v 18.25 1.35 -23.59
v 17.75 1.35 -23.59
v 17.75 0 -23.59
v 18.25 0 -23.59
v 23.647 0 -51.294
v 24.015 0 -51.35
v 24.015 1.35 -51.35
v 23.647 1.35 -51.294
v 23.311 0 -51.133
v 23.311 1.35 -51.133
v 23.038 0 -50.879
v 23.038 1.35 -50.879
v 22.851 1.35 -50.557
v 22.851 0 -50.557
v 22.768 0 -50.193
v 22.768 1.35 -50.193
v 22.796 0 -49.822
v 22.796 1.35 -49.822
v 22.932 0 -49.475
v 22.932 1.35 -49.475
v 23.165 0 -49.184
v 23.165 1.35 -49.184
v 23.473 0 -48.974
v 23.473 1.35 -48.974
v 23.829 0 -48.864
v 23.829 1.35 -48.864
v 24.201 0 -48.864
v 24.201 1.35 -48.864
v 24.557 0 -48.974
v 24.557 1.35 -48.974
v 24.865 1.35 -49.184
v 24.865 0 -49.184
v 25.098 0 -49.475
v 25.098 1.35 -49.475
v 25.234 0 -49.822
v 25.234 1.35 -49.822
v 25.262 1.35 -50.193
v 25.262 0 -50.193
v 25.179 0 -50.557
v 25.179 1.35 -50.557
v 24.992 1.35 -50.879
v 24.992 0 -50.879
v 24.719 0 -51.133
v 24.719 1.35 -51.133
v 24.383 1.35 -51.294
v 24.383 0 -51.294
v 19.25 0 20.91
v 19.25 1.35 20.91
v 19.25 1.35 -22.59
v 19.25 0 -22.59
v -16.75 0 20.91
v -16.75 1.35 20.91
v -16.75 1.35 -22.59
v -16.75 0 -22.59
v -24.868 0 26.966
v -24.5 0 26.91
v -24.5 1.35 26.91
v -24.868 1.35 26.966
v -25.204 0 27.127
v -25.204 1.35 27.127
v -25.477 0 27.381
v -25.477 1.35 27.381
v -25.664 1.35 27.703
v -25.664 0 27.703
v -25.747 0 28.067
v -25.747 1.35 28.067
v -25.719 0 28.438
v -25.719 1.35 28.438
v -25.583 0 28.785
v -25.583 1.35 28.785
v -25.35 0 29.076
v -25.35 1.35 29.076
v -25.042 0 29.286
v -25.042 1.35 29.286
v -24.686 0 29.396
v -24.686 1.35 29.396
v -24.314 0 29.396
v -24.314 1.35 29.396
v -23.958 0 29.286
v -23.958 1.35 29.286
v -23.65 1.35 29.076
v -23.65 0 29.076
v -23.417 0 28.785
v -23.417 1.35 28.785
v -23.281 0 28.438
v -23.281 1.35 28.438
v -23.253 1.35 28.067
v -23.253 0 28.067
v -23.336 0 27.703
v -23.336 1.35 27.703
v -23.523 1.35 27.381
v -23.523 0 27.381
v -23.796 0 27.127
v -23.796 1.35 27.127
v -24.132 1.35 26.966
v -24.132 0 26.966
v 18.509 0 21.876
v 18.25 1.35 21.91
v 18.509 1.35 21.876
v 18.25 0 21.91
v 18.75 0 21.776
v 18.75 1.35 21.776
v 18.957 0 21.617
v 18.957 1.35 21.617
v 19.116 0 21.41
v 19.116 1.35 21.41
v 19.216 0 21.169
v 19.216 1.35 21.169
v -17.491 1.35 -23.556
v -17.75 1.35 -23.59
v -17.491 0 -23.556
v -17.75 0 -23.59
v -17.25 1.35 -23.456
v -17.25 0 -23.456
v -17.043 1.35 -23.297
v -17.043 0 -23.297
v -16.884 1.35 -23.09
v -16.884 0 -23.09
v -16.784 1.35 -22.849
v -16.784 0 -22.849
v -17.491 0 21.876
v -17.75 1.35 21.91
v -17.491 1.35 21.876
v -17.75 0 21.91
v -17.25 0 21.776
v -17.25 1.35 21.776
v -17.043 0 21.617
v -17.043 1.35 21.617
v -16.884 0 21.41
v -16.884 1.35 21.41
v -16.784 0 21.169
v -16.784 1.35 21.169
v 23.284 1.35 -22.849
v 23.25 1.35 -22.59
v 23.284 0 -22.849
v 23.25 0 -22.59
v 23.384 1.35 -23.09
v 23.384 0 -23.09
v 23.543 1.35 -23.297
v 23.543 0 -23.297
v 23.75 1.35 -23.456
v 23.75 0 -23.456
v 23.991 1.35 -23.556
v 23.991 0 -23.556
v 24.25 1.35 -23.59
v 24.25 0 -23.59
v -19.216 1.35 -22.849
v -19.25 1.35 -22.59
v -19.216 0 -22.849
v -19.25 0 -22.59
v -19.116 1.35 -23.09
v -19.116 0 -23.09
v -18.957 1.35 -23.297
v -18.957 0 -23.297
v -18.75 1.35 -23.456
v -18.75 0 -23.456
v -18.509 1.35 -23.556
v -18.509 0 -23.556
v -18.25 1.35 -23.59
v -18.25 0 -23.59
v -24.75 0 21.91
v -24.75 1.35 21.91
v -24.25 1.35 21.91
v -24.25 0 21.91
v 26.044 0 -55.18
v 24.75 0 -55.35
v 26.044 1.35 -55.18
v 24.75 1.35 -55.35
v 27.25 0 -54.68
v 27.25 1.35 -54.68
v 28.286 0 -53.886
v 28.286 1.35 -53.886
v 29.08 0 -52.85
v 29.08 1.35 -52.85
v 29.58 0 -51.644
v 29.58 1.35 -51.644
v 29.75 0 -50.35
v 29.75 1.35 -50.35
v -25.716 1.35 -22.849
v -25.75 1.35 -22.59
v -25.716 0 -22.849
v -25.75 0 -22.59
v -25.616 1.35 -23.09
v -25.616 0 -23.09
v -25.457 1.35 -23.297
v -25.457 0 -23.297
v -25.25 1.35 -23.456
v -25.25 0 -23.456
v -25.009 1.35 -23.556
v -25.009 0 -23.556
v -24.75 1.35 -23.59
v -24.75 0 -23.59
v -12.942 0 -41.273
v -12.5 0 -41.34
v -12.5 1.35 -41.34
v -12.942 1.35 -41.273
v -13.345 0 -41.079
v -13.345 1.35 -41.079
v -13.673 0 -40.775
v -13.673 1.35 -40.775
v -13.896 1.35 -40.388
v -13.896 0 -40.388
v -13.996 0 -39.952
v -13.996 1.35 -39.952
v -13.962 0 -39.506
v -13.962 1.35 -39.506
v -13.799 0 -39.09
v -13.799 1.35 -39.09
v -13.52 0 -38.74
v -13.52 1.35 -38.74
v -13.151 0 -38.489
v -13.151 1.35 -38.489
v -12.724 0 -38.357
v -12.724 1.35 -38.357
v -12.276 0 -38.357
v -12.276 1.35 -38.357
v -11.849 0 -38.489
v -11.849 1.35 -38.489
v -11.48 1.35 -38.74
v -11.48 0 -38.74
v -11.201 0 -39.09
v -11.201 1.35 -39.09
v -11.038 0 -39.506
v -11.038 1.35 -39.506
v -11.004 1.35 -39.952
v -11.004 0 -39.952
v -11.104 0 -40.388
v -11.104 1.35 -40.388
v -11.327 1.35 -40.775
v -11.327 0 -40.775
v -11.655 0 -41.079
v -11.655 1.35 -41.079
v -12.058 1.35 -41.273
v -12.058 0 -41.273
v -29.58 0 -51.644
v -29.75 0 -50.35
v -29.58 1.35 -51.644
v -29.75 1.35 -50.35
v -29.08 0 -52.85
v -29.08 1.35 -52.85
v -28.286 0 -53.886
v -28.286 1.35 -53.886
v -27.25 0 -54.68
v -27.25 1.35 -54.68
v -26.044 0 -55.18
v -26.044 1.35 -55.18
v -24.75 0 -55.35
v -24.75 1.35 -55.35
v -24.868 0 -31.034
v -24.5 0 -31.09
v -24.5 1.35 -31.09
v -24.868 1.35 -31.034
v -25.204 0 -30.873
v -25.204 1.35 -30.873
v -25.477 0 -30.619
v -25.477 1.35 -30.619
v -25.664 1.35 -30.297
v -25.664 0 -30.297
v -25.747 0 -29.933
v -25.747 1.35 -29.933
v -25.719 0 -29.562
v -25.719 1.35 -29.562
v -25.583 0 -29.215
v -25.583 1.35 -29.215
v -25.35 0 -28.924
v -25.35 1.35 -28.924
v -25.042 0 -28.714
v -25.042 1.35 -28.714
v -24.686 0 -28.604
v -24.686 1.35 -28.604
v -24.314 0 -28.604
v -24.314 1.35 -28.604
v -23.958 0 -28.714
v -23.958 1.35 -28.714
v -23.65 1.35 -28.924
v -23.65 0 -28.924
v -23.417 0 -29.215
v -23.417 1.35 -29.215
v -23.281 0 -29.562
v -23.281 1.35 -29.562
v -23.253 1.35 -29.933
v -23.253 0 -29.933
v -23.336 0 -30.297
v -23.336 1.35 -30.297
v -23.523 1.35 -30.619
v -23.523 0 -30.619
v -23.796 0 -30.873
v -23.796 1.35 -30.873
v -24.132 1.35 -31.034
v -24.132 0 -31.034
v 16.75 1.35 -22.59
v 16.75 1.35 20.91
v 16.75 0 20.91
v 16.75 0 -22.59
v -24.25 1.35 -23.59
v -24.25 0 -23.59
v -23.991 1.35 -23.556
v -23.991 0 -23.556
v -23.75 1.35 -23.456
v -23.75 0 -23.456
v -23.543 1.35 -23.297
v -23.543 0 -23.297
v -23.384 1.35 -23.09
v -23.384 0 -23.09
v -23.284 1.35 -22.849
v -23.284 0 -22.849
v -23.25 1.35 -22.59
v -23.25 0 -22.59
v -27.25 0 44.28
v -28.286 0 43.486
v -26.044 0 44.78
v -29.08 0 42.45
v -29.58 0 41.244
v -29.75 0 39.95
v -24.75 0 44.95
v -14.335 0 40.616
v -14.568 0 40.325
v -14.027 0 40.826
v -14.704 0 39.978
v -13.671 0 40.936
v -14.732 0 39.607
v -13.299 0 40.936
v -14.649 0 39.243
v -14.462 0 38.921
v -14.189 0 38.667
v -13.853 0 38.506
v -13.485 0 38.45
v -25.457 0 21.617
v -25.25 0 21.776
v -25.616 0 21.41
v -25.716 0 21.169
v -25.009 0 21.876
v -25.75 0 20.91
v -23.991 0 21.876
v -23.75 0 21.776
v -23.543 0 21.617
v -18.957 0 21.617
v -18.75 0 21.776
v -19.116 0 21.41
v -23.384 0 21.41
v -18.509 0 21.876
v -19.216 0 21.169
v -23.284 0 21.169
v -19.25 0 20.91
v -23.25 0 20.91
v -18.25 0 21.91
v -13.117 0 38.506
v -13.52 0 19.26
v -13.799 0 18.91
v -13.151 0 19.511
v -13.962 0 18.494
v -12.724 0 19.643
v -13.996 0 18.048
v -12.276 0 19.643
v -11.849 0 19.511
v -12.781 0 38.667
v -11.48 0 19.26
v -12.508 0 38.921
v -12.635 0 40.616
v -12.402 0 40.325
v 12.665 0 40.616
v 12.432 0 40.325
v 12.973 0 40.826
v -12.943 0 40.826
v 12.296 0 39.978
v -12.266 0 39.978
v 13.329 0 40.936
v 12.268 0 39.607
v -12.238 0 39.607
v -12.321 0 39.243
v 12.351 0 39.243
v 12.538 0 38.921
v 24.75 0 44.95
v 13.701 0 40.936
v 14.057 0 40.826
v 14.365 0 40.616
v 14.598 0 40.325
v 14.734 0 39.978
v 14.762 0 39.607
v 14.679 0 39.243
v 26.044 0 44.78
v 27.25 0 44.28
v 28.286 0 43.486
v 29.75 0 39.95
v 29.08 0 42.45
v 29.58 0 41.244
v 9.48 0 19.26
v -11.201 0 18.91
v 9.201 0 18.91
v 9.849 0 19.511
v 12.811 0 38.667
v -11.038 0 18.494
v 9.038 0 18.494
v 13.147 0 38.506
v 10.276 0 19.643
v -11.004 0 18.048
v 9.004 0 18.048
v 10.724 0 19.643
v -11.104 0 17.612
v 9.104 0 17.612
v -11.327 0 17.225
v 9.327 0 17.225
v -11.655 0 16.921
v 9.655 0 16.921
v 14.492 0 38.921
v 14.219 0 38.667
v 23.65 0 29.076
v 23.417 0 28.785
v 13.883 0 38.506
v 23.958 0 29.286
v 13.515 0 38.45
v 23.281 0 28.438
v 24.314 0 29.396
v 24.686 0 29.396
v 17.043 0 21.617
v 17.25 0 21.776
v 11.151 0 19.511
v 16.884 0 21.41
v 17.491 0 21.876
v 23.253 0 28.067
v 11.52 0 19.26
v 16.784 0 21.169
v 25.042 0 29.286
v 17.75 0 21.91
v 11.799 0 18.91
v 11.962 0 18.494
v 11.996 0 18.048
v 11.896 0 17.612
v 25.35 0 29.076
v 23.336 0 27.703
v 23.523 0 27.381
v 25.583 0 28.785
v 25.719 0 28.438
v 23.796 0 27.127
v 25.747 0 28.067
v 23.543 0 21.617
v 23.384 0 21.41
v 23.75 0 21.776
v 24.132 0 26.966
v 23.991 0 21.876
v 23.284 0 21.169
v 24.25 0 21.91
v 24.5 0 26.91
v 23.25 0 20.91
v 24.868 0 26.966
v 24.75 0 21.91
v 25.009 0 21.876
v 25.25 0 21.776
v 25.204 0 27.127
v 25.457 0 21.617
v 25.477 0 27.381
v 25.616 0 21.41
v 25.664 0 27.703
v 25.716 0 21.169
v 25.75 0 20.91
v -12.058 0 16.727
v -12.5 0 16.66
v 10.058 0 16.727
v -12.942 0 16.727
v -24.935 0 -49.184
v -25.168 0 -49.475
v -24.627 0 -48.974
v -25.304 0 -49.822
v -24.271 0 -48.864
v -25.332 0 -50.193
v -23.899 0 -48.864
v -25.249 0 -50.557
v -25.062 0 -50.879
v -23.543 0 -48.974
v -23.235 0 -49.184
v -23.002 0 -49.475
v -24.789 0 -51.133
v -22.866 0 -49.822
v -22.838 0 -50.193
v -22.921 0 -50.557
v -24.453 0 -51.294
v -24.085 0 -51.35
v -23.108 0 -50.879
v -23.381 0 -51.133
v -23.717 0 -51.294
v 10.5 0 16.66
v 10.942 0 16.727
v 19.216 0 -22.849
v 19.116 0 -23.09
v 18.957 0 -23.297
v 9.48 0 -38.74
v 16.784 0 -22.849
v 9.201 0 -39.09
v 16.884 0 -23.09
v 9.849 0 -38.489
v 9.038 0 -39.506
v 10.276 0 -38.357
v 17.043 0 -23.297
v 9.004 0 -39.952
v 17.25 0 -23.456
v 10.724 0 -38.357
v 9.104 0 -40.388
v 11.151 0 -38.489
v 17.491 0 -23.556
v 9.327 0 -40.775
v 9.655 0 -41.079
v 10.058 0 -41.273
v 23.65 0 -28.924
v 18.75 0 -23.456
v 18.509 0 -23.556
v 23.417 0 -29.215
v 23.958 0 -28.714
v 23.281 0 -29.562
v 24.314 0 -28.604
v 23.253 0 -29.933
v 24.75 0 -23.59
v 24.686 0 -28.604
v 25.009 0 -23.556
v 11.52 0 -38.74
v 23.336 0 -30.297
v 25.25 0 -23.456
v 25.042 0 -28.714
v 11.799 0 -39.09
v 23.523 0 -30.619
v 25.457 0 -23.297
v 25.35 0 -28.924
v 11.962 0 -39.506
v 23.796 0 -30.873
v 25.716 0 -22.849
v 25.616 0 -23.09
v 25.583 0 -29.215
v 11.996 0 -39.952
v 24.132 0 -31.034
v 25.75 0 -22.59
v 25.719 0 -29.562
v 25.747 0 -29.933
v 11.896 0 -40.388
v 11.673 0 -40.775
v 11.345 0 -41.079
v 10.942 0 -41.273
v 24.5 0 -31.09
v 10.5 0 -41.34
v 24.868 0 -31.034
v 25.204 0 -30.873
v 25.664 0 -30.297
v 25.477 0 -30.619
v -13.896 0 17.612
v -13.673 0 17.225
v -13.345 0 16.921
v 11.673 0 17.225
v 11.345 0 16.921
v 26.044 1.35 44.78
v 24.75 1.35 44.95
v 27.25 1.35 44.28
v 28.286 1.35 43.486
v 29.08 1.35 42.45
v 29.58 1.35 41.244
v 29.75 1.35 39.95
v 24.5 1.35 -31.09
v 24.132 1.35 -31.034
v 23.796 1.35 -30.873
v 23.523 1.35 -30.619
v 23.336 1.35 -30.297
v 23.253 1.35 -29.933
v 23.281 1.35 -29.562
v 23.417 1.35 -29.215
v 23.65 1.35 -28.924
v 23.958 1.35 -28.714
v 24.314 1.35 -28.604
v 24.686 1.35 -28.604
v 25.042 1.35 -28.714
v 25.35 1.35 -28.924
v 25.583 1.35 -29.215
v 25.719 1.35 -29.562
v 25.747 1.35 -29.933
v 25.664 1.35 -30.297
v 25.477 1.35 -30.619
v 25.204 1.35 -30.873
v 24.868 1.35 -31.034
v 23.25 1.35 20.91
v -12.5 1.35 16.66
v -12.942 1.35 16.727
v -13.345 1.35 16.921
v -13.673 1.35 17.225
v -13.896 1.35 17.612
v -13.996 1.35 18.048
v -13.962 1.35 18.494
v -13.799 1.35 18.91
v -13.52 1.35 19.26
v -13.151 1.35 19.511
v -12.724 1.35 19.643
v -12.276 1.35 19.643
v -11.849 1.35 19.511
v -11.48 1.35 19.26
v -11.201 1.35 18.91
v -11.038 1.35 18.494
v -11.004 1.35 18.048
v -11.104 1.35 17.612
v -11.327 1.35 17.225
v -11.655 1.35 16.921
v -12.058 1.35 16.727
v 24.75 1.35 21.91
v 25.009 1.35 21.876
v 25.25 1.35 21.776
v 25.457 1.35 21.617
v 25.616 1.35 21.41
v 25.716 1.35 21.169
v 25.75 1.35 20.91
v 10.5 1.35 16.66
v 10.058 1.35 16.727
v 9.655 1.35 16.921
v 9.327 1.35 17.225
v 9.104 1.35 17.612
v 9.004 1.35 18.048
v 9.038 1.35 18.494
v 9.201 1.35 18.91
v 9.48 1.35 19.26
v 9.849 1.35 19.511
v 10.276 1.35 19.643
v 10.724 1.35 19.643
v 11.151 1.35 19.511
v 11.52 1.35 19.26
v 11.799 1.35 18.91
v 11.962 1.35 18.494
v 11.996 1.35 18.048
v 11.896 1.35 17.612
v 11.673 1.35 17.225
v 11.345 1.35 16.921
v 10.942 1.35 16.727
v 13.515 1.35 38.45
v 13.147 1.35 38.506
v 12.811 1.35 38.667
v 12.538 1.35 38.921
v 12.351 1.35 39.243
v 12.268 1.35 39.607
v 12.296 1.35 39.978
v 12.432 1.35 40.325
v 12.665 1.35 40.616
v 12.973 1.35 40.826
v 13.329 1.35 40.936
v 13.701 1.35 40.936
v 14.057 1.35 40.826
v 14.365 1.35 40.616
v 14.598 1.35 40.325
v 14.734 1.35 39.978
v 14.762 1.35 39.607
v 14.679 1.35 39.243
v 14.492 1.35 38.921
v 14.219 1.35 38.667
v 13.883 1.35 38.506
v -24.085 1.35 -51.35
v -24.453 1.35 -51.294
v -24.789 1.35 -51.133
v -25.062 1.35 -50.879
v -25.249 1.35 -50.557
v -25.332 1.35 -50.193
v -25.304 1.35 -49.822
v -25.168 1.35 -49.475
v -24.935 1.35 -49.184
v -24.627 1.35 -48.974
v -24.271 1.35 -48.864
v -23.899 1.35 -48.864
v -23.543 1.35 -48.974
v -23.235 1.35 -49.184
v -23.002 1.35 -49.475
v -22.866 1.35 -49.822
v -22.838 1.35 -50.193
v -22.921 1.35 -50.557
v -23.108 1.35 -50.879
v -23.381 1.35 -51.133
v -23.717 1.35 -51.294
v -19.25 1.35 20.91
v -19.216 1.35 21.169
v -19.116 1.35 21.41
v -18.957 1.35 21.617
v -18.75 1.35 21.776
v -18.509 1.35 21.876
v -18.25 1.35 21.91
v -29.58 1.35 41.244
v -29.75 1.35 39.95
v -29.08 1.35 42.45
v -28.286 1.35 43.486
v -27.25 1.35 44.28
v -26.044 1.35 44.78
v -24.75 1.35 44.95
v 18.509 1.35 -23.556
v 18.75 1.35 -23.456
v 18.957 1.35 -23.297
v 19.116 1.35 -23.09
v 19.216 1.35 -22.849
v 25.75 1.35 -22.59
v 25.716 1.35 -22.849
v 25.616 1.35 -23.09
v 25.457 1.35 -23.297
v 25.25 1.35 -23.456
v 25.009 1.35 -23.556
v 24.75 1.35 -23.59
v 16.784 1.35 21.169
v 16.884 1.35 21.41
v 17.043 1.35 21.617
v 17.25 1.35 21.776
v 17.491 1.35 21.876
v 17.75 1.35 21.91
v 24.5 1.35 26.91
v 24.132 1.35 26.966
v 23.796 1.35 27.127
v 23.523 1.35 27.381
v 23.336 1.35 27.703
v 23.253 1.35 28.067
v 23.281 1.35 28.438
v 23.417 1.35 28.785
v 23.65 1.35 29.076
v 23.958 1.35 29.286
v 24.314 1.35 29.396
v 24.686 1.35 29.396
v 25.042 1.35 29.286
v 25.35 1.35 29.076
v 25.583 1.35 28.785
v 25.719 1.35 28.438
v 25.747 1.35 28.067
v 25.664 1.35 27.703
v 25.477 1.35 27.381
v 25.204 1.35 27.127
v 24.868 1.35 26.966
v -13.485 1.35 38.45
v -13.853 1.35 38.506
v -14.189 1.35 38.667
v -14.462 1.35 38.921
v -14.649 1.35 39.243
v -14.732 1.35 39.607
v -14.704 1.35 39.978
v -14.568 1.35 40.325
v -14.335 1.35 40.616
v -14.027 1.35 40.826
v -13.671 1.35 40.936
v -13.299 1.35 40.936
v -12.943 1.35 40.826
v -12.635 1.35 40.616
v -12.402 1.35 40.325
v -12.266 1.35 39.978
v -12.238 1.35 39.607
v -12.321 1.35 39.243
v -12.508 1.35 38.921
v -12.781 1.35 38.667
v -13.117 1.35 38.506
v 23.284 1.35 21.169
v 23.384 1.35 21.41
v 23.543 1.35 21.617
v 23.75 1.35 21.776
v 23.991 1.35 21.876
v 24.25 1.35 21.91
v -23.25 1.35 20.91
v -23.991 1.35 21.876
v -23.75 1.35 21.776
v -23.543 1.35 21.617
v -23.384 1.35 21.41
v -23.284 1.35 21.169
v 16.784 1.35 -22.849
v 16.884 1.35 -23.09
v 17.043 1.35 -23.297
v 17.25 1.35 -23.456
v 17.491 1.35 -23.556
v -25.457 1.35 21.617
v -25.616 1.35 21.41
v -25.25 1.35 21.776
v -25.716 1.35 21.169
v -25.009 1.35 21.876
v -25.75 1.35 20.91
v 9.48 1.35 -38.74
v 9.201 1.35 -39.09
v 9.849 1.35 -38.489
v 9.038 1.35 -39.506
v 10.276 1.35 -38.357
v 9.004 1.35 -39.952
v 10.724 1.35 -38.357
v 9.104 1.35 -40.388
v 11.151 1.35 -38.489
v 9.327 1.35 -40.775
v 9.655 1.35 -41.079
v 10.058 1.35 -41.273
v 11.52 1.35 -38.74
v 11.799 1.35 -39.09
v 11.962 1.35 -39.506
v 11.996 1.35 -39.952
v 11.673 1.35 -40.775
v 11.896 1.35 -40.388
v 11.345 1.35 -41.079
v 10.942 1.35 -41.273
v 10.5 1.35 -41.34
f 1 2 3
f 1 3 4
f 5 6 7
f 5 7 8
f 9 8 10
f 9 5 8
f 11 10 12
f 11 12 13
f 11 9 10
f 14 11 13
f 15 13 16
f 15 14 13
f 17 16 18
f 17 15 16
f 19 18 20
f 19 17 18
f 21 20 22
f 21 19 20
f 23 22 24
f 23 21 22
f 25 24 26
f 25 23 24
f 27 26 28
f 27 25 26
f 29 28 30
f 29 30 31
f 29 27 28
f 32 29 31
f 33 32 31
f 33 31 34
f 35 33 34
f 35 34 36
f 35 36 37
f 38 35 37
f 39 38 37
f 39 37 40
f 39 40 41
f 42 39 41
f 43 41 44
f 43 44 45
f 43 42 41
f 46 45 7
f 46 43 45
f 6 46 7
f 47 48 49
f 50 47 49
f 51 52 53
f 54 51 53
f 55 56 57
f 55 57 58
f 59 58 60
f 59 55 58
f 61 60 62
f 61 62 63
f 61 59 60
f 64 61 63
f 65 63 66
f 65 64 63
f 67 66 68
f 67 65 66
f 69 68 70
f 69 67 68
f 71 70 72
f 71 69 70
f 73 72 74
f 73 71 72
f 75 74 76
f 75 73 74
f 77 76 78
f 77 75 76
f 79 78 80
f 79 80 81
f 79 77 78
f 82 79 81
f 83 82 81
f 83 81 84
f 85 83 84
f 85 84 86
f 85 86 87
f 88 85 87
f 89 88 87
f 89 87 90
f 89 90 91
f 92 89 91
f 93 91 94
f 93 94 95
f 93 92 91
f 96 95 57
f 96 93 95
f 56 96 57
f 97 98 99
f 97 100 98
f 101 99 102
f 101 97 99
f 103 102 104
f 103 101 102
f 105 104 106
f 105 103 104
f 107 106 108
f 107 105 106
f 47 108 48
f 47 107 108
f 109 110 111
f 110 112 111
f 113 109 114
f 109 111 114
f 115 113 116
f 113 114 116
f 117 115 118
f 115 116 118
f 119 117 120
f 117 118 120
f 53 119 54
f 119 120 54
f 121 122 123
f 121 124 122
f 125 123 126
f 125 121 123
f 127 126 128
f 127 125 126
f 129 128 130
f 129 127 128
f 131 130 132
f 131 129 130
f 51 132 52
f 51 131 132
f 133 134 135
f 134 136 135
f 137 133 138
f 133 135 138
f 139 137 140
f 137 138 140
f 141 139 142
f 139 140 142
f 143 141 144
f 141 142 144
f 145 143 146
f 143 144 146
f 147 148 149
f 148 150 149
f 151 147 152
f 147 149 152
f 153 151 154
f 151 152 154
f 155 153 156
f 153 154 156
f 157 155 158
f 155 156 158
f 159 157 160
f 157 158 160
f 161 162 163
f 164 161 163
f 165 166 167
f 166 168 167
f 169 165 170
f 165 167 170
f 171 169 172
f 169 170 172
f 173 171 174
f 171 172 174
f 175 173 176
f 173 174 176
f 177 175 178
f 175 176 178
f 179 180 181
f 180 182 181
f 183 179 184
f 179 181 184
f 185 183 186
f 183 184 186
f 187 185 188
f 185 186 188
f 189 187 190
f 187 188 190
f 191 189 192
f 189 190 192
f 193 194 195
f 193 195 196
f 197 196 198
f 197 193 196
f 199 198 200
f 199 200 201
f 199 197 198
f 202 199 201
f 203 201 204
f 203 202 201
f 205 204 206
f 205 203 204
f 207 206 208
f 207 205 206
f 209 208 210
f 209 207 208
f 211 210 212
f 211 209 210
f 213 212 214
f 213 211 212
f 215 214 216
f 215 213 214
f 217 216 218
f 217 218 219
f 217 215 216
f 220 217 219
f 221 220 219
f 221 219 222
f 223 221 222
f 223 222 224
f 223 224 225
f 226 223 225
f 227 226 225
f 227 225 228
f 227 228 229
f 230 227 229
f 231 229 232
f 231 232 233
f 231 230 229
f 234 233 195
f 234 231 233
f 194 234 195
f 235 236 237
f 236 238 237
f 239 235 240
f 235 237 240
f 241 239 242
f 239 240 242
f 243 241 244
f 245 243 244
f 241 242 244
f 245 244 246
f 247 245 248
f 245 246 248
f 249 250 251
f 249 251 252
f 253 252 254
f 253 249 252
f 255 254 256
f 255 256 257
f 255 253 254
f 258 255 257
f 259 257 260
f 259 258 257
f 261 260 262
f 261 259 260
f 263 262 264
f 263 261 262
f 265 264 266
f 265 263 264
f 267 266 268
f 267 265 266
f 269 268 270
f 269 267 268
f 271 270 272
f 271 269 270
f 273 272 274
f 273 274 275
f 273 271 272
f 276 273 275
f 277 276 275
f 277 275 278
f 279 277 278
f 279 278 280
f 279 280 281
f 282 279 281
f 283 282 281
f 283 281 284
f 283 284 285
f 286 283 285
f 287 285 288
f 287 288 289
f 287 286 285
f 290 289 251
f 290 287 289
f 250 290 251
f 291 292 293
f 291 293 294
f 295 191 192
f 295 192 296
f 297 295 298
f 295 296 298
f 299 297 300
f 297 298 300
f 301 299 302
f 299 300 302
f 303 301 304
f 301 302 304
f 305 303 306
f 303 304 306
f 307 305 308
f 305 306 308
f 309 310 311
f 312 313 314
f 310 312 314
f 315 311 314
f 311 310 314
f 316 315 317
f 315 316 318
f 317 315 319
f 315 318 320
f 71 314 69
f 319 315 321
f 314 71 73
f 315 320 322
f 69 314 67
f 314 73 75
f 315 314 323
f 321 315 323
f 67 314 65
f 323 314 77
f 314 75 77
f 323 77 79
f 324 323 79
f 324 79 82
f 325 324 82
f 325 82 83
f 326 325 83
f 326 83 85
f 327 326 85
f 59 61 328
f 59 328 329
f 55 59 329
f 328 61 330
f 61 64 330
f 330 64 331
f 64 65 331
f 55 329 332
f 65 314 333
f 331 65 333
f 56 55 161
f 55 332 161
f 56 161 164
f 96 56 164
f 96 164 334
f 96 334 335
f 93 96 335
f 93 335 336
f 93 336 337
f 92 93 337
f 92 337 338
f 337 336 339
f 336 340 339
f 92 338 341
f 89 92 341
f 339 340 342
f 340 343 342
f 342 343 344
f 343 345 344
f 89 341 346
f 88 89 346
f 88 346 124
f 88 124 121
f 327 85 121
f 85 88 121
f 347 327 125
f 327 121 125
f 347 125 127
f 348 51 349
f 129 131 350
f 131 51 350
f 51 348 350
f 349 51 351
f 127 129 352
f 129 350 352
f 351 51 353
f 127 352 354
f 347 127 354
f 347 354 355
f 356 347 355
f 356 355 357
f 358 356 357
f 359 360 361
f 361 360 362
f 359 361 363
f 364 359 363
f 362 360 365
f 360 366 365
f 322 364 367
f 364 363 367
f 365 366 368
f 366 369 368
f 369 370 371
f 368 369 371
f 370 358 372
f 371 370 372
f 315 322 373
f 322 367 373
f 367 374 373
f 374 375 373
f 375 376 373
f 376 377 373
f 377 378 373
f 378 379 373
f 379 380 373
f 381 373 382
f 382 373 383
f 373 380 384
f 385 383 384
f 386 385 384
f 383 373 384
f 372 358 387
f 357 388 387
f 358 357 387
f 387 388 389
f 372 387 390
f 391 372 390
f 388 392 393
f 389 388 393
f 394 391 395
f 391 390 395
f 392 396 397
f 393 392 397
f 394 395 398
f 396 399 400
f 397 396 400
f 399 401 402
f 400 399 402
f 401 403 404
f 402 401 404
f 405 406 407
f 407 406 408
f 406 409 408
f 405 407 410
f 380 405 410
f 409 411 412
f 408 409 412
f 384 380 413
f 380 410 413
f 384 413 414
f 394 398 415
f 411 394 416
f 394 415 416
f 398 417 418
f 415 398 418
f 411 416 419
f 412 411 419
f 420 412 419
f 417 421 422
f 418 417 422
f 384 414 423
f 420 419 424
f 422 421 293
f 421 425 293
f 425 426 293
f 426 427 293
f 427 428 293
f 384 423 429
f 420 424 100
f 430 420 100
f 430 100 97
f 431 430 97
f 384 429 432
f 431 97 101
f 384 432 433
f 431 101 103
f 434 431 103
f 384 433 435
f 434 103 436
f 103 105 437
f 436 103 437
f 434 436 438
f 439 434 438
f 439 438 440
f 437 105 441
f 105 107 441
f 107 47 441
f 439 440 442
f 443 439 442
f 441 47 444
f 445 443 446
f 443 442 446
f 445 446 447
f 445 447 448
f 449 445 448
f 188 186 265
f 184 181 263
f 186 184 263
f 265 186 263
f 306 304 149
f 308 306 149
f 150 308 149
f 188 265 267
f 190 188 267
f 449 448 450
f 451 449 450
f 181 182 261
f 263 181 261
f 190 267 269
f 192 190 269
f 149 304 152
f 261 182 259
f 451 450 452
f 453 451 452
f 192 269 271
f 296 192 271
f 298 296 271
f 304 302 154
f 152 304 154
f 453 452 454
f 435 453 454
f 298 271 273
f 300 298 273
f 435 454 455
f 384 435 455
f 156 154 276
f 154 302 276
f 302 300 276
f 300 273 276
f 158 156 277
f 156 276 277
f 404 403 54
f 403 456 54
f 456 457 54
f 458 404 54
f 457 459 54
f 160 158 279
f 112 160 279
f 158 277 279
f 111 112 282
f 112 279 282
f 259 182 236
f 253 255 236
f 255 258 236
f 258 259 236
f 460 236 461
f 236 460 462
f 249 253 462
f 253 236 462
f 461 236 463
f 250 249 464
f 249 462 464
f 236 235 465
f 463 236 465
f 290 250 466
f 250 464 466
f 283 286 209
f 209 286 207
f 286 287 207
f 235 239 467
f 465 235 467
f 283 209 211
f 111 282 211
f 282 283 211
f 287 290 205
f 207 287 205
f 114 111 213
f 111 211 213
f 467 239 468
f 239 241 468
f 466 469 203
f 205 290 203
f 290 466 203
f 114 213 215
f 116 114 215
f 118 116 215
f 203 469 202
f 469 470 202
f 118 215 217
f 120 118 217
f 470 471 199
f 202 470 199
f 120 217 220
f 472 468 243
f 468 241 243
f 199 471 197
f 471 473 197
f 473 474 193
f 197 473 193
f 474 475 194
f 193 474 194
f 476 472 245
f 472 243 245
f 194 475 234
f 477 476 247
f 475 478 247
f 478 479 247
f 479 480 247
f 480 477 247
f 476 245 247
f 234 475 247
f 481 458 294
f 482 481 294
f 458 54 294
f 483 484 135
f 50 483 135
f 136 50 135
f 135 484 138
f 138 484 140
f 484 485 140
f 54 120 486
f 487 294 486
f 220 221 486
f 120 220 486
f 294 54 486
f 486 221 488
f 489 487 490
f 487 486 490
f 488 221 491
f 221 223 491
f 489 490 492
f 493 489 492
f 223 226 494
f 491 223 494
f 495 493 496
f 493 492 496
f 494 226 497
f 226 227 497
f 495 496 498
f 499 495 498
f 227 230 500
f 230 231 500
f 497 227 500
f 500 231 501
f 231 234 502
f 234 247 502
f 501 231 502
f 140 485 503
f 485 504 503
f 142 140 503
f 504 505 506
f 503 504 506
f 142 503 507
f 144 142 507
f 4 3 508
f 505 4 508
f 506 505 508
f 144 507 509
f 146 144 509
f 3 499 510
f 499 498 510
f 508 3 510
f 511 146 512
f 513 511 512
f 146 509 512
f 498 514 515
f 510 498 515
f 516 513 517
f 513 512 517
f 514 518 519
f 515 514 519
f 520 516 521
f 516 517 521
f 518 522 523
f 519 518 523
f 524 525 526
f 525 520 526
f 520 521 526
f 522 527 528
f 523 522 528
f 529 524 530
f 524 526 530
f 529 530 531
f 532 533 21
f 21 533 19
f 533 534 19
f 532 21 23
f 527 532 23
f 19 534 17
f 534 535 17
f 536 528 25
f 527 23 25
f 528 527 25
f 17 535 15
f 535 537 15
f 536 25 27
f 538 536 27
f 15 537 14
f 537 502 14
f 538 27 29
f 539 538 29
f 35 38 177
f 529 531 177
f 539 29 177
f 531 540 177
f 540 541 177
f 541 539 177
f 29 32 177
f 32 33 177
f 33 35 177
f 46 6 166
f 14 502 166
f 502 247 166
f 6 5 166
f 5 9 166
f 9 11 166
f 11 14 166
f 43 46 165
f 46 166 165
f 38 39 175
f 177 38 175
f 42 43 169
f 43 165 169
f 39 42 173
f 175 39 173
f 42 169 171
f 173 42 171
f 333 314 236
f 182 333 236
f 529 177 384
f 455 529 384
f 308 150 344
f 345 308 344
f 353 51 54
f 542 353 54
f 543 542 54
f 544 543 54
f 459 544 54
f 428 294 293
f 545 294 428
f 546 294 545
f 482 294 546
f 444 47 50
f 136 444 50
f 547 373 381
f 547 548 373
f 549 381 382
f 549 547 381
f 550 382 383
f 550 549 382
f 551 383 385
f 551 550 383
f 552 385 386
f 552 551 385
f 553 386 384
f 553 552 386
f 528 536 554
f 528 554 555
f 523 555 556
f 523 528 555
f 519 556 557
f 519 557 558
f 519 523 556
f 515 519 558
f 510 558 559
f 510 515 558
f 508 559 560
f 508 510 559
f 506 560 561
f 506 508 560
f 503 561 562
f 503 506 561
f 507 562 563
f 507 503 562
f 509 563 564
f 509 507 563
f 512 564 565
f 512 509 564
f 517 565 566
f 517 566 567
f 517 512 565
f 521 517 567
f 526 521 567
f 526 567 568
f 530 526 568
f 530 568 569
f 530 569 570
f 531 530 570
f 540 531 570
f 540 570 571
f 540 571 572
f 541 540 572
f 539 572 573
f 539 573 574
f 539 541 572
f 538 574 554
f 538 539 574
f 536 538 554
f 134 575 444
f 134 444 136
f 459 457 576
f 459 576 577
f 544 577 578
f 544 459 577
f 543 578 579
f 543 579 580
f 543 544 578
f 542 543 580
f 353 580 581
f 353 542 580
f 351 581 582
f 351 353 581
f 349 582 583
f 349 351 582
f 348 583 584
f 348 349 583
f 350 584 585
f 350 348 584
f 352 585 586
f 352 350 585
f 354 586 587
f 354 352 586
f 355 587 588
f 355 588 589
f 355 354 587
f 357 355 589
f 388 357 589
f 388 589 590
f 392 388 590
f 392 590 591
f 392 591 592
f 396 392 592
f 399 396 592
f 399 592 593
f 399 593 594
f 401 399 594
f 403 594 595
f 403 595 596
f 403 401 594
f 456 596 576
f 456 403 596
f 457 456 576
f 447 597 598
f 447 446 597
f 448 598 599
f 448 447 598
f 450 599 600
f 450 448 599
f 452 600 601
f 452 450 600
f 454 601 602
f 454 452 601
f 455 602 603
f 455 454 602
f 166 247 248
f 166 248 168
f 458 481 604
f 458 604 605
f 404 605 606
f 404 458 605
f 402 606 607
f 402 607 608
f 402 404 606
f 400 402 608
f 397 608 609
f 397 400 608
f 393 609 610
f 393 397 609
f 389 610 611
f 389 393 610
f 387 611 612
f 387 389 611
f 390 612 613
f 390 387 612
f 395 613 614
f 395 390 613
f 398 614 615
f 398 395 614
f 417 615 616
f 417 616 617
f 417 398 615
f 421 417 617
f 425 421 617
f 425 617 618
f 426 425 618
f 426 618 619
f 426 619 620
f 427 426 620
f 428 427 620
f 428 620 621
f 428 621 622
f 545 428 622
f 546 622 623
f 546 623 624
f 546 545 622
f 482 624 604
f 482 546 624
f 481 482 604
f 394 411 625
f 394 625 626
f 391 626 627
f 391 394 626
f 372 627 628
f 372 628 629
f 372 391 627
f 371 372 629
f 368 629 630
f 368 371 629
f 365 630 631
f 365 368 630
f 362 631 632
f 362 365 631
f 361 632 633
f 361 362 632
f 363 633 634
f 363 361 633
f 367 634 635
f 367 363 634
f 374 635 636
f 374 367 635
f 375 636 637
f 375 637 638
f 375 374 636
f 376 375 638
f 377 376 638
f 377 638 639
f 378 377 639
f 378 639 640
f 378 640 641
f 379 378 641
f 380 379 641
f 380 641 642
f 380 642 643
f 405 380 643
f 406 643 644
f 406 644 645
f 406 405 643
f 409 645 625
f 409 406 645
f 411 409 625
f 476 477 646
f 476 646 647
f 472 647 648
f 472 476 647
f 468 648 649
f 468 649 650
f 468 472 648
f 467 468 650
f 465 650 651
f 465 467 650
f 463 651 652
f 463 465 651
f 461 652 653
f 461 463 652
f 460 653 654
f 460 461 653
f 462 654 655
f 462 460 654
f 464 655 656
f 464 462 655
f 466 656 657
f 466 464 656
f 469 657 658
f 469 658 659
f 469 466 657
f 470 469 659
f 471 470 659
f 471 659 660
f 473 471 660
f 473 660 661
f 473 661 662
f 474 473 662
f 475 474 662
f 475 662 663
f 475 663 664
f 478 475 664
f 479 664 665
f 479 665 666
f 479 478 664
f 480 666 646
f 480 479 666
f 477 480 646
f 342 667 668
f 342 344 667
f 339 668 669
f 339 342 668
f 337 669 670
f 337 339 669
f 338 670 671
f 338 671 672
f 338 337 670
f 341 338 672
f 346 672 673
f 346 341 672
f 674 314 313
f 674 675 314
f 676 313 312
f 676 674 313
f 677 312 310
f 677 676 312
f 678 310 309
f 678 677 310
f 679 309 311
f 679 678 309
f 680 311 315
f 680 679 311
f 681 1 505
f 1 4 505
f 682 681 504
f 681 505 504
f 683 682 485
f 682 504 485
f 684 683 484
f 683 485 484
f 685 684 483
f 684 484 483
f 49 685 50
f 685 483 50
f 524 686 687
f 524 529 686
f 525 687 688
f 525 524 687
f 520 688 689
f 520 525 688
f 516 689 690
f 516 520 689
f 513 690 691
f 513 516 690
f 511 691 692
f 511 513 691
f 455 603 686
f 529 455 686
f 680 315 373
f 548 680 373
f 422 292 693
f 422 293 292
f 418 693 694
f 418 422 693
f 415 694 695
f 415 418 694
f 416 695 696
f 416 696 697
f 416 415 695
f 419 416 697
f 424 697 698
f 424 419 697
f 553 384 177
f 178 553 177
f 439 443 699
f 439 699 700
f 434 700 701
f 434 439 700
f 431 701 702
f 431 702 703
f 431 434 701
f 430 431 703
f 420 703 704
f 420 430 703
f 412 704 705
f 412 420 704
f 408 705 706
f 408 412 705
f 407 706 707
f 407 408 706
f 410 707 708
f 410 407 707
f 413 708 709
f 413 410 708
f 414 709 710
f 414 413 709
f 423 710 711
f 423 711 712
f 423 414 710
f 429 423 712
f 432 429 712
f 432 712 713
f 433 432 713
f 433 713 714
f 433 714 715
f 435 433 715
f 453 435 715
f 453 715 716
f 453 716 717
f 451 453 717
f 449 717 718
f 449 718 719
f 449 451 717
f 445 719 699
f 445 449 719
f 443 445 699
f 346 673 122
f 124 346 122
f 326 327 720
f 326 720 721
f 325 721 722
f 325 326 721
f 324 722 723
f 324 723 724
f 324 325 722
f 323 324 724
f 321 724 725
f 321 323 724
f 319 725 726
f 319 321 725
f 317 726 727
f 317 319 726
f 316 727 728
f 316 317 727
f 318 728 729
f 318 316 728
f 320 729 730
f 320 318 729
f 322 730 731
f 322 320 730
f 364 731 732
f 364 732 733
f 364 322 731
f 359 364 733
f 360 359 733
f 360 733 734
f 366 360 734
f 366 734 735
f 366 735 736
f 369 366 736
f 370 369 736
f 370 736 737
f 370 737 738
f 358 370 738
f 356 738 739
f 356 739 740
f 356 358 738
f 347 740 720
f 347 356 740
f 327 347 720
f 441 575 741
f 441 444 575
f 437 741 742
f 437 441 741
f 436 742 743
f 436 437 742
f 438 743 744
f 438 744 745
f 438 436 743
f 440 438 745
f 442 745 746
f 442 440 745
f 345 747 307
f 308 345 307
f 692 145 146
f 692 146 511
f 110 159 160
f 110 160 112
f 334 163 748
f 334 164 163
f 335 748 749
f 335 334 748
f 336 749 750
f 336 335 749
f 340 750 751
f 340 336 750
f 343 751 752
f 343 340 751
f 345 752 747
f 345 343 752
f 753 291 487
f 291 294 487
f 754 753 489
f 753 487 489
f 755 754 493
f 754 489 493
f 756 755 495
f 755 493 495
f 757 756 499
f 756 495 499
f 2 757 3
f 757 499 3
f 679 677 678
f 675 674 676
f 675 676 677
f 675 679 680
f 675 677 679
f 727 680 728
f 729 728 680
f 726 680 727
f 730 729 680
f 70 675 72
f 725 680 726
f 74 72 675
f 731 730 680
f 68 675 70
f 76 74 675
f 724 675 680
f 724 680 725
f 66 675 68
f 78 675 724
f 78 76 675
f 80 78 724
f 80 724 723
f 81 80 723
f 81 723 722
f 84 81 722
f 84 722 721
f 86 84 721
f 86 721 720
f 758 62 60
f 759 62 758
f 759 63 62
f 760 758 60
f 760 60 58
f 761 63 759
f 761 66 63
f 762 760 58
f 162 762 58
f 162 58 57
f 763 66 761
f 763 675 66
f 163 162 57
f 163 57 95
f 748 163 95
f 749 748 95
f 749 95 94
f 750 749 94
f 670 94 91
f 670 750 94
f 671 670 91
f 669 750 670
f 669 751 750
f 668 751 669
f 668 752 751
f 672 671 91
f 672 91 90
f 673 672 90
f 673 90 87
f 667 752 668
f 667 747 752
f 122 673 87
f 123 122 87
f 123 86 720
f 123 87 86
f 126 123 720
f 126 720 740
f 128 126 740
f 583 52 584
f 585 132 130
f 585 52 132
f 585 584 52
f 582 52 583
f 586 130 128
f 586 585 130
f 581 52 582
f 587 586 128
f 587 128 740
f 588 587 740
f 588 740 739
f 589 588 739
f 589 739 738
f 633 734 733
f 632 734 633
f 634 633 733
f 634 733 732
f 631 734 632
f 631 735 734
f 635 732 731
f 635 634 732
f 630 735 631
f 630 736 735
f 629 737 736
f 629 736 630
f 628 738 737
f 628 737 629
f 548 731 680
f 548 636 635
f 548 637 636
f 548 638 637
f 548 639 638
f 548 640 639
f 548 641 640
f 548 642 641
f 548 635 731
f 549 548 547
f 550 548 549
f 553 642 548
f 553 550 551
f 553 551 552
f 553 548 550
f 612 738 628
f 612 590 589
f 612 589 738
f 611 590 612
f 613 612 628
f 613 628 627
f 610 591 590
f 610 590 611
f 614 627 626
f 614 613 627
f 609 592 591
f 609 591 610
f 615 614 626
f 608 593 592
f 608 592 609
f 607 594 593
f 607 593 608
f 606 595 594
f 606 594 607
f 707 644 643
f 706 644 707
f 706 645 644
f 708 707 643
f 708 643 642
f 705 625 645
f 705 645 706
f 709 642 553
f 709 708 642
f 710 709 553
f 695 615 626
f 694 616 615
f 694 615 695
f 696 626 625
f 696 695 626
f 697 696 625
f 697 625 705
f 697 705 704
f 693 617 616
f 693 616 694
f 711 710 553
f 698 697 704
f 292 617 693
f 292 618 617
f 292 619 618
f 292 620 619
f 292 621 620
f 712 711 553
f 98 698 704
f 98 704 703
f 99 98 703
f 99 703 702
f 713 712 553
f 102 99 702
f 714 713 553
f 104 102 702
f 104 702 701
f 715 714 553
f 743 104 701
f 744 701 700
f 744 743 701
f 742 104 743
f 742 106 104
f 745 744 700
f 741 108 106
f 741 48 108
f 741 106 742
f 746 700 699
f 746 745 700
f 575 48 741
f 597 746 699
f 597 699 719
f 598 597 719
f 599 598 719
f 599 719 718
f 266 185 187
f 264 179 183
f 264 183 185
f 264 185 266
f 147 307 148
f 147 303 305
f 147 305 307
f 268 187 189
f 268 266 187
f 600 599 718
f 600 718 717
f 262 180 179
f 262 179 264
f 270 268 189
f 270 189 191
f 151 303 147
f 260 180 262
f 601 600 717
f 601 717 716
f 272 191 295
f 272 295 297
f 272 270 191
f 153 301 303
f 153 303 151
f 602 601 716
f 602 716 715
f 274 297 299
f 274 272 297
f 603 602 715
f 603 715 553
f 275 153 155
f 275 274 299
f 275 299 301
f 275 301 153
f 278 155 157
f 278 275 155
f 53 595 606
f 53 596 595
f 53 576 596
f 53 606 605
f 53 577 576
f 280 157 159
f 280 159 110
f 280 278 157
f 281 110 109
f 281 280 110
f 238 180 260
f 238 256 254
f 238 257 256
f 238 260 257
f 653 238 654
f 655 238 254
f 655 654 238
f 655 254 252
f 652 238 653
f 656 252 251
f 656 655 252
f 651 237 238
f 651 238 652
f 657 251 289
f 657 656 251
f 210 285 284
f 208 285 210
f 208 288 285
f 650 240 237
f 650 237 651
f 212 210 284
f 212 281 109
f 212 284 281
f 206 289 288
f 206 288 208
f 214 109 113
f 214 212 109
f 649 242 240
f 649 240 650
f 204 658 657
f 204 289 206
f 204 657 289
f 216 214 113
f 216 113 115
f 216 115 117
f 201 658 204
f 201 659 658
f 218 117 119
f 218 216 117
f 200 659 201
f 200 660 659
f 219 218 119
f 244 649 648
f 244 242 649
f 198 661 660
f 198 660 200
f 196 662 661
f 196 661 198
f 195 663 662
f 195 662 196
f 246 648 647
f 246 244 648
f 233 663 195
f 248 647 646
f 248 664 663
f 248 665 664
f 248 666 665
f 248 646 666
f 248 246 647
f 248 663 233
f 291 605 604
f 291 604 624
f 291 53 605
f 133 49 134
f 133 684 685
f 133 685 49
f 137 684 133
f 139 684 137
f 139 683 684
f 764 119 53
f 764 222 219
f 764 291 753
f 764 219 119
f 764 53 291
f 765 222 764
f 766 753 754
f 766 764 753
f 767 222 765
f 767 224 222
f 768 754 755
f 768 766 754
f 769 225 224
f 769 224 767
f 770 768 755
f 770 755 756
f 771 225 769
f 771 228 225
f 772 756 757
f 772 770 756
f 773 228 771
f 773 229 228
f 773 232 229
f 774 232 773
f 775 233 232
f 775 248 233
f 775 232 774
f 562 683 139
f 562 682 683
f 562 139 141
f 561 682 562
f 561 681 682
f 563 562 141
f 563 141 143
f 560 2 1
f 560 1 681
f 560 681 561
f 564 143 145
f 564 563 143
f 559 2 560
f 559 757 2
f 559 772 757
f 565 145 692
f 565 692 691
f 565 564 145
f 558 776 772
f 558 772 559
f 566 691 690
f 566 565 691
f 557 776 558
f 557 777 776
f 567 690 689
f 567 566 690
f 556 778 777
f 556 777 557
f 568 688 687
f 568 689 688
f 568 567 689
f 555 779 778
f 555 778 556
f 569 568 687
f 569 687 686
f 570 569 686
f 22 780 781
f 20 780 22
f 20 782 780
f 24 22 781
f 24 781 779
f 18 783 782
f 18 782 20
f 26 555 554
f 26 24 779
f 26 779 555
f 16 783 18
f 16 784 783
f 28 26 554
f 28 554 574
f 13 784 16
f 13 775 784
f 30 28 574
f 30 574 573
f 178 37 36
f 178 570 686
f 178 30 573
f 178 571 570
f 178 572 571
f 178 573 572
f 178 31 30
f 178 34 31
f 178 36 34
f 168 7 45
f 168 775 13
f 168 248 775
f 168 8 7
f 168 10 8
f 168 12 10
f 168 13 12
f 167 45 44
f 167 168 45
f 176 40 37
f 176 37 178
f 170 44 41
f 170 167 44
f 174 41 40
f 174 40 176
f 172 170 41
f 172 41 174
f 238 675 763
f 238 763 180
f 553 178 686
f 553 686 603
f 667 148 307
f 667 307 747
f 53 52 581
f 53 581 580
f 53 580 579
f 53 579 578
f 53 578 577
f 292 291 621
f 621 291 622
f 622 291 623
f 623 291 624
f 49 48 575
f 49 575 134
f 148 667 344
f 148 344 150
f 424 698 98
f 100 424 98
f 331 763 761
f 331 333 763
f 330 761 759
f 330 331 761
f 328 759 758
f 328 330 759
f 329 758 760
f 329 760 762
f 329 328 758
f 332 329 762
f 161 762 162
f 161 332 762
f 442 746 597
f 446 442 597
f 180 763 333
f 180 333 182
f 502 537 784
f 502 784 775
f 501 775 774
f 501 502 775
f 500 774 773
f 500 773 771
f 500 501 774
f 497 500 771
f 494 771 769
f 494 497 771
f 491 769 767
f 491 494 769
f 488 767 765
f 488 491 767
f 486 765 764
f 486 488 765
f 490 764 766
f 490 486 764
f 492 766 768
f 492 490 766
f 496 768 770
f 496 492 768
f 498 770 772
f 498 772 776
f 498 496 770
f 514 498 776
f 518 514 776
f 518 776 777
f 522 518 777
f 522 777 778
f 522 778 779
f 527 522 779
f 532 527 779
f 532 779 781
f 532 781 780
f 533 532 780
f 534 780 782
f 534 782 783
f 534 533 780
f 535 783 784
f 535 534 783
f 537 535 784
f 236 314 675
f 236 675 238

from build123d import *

# Parameters (mm, degrees)
SKETCH2_W           = 59.5
SKETCH2_H           = 100.3
SKETCH2_R           = 1.25
SKETCH2_R_2         = 1.5
BOSS_EXTRUDE1_DEPTH = 1.35
FILLET1_R           = 5
CUT_EXTRUDE1_REACH  = 64.853
SKETCH3_W           = 2.5
SKETCH3_H           = 45.5
FILLET2_R           = 1


with BuildPart() as part:
    # Sketch2 → Boss-Extrude1 (new body)
    with BuildSketch(Plane(origin=(0, 0, 0), x_dir=(1, 0, 0), z_dir=(0, 1, 0))):
        with Locations((0, 5.2)):
            Rectangle(SKETCH2_W, SKETCH2_H)
        with Locations(Location((-24.5, 29.84, 0), (0, 0, 90))):
            Circle(SKETCH2_R, mode=Mode.SUBTRACT)
        with Locations(Location((-24.085, 50.1, 0), (0, 0, 90))):
            Circle(SKETCH2_R, mode=Mode.SUBTRACT)
        with Locations(Location((24.015, 50.1, 0), (0, 0, 90))):
            Circle(SKETCH2_R, mode=Mode.SUBTRACT)
        with Locations(Location((24.5, 29.84, 0), (0, 0, 90))):
            Circle(SKETCH2_R, mode=Mode.SUBTRACT)
        with Locations(Location((24.5, -28.16, 0), (0, 0, 90))):
            Circle(SKETCH2_R, mode=Mode.SUBTRACT)
        with Locations(Location((-24.5, -28.16, 0), (0, 0, 90))):
            Circle(SKETCH2_R, mode=Mode.SUBTRACT)
        with Locations(Location((-13.485, -39.7, 0), (0, 0, 90))):
            Circle(SKETCH2_R, mode=Mode.SUBTRACT)
        with Locations(Location((13.515, -39.7, 0), (0, 0, 90))):
            Circle(SKETCH2_R, mode=Mode.SUBTRACT)
        with Locations(Location((-12.5, -18.16, 0), (0, 0, 90))):
            Circle(SKETCH2_R_2, mode=Mode.SUBTRACT)
        with Locations(Location((10.5, -18.16, 0), (0, 0, 90))):
            Circle(SKETCH2_R_2, mode=Mode.SUBTRACT)
        with Locations(Location((10.5, 39.84, 0), (0, 0, 90))):
            Circle(SKETCH2_R_2, mode=Mode.SUBTRACT)
        with Locations(Location((-12.5, 39.84, 0), (0, 0, 90))):
            Circle(SKETCH2_R_2, mode=Mode.SUBTRACT)
    extrude(amount=BOSS_EXTRUDE1_DEPTH)

    # Fillet1
    fillet1_edges = [part.edges().sort_by_distance(p)[0] for p in [
        (29.75, 0.675, -55.35),
        (29.75, 0.675, 44.95),
        (-29.75, 0.675, 44.95),
        (-29.75, 0.675, -55.35),
    ]]
    fillet(fillet1_edges, radius=FILLET1_R)

    # Sketch3 → Cut-Extrude1 (cut, up to next)
    with BuildSketch(Plane(origin=(0, 1.35, 0), x_dir=(1, 0, 0), z_dir=(0, 1, 0)), mode=Mode.PRIVATE) as cut_extrude1_sk1:
        with Locations((18, 0.84)):
            Rectangle(SKETCH3_W, SKETCH3_H)
    cut_extrude1_tool1 = extrude(cut_extrude1_sk1.sketch, amount=-CUT_EXTRUDE1_REACH, mode=Mode.PRIVATE) & part.part
    # Sketch3 → Cut-Extrude1 (cut, up to next)
    with BuildSketch(Plane(origin=(0, 1.35, 0), x_dir=(1, 0, 0), z_dir=(0, 1, 0)), mode=Mode.PRIVATE) as cut_extrude1_sk2:
        with Locations((-24.5, 0.84)):
            Rectangle(SKETCH3_W, SKETCH3_H)
    cut_extrude1_tool2 = extrude(cut_extrude1_sk2.sketch, amount=-CUT_EXTRUDE1_REACH, mode=Mode.PRIVATE) & part.part
    # Sketch3 → Cut-Extrude1 (cut, up to next)
    with BuildSketch(Plane(origin=(0, 1.35, 0), x_dir=(1, 0, 0), z_dir=(0, 1, 0)), mode=Mode.PRIVATE) as cut_extrude1_sk3:
        with Locations((-18, 0.84)):
            Rectangle(SKETCH3_W, SKETCH3_H)
    cut_extrude1_tool3 = extrude(cut_extrude1_sk3.sketch, amount=-CUT_EXTRUDE1_REACH, mode=Mode.PRIVATE) & part.part
    # Sketch3 → Cut-Extrude1 (cut, up to next)
    with BuildSketch(Plane(origin=(0, 1.35, 0), x_dir=(1, 0, 0), z_dir=(0, 1, 0)), mode=Mode.PRIVATE) as cut_extrude1_sk4:
        with Locations((24.5, 0.84)):
            Rectangle(SKETCH3_W, SKETCH3_H)
    cut_extrude1_tool4 = extrude(cut_extrude1_sk4.sketch, amount=-CUT_EXTRUDE1_REACH, mode=Mode.PRIVATE) & part.part
    add(cut_extrude1_tool1.solids().sort_by_distance((18, 1.35, -0.84))[0], mode=Mode.SUBTRACT)
    add(cut_extrude1_tool2.solids().sort_by_distance((-24.5, 1.35, -0.84))[0], mode=Mode.SUBTRACT)
    add(cut_extrude1_tool3.solids().sort_by_distance((-18, 1.35, -0.84))[0], mode=Mode.SUBTRACT)
    add(cut_extrude1_tool4.solids().sort_by_distance((24.5, 1.35, -0.84))[0], mode=Mode.SUBTRACT)

    # Fillet2
    fillet2_edges = [part.edges().sort_by_distance(p)[0] for p in [
        (-23.25, 0.675, -23.59),
        (-23.25, 0.675, 21.91),
        (-25.75, 0.675, 21.91),
        (-25.75, 0.675, -23.59),
        (-16.75, 0.675, -23.59),
        (-16.75, 0.675, 21.91),
        (-19.25, 0.675, 21.91),
        (-19.25, 0.675, -23.59),
        (19.25, 0.675, -23.59),
        (19.25, 0.675, 21.91),
        (16.75, 0.675, 21.91),
        (16.75, 0.675, -23.59),
        (25.75, 0.675, -23.59),
        (25.75, 0.675, 21.91),
        (23.25, 0.675, 21.91),
        (23.25, 0.675, -23.59),
    ]]
    fillet(fillet2_edges, radius=FILLET2_R)


solid = part.part
